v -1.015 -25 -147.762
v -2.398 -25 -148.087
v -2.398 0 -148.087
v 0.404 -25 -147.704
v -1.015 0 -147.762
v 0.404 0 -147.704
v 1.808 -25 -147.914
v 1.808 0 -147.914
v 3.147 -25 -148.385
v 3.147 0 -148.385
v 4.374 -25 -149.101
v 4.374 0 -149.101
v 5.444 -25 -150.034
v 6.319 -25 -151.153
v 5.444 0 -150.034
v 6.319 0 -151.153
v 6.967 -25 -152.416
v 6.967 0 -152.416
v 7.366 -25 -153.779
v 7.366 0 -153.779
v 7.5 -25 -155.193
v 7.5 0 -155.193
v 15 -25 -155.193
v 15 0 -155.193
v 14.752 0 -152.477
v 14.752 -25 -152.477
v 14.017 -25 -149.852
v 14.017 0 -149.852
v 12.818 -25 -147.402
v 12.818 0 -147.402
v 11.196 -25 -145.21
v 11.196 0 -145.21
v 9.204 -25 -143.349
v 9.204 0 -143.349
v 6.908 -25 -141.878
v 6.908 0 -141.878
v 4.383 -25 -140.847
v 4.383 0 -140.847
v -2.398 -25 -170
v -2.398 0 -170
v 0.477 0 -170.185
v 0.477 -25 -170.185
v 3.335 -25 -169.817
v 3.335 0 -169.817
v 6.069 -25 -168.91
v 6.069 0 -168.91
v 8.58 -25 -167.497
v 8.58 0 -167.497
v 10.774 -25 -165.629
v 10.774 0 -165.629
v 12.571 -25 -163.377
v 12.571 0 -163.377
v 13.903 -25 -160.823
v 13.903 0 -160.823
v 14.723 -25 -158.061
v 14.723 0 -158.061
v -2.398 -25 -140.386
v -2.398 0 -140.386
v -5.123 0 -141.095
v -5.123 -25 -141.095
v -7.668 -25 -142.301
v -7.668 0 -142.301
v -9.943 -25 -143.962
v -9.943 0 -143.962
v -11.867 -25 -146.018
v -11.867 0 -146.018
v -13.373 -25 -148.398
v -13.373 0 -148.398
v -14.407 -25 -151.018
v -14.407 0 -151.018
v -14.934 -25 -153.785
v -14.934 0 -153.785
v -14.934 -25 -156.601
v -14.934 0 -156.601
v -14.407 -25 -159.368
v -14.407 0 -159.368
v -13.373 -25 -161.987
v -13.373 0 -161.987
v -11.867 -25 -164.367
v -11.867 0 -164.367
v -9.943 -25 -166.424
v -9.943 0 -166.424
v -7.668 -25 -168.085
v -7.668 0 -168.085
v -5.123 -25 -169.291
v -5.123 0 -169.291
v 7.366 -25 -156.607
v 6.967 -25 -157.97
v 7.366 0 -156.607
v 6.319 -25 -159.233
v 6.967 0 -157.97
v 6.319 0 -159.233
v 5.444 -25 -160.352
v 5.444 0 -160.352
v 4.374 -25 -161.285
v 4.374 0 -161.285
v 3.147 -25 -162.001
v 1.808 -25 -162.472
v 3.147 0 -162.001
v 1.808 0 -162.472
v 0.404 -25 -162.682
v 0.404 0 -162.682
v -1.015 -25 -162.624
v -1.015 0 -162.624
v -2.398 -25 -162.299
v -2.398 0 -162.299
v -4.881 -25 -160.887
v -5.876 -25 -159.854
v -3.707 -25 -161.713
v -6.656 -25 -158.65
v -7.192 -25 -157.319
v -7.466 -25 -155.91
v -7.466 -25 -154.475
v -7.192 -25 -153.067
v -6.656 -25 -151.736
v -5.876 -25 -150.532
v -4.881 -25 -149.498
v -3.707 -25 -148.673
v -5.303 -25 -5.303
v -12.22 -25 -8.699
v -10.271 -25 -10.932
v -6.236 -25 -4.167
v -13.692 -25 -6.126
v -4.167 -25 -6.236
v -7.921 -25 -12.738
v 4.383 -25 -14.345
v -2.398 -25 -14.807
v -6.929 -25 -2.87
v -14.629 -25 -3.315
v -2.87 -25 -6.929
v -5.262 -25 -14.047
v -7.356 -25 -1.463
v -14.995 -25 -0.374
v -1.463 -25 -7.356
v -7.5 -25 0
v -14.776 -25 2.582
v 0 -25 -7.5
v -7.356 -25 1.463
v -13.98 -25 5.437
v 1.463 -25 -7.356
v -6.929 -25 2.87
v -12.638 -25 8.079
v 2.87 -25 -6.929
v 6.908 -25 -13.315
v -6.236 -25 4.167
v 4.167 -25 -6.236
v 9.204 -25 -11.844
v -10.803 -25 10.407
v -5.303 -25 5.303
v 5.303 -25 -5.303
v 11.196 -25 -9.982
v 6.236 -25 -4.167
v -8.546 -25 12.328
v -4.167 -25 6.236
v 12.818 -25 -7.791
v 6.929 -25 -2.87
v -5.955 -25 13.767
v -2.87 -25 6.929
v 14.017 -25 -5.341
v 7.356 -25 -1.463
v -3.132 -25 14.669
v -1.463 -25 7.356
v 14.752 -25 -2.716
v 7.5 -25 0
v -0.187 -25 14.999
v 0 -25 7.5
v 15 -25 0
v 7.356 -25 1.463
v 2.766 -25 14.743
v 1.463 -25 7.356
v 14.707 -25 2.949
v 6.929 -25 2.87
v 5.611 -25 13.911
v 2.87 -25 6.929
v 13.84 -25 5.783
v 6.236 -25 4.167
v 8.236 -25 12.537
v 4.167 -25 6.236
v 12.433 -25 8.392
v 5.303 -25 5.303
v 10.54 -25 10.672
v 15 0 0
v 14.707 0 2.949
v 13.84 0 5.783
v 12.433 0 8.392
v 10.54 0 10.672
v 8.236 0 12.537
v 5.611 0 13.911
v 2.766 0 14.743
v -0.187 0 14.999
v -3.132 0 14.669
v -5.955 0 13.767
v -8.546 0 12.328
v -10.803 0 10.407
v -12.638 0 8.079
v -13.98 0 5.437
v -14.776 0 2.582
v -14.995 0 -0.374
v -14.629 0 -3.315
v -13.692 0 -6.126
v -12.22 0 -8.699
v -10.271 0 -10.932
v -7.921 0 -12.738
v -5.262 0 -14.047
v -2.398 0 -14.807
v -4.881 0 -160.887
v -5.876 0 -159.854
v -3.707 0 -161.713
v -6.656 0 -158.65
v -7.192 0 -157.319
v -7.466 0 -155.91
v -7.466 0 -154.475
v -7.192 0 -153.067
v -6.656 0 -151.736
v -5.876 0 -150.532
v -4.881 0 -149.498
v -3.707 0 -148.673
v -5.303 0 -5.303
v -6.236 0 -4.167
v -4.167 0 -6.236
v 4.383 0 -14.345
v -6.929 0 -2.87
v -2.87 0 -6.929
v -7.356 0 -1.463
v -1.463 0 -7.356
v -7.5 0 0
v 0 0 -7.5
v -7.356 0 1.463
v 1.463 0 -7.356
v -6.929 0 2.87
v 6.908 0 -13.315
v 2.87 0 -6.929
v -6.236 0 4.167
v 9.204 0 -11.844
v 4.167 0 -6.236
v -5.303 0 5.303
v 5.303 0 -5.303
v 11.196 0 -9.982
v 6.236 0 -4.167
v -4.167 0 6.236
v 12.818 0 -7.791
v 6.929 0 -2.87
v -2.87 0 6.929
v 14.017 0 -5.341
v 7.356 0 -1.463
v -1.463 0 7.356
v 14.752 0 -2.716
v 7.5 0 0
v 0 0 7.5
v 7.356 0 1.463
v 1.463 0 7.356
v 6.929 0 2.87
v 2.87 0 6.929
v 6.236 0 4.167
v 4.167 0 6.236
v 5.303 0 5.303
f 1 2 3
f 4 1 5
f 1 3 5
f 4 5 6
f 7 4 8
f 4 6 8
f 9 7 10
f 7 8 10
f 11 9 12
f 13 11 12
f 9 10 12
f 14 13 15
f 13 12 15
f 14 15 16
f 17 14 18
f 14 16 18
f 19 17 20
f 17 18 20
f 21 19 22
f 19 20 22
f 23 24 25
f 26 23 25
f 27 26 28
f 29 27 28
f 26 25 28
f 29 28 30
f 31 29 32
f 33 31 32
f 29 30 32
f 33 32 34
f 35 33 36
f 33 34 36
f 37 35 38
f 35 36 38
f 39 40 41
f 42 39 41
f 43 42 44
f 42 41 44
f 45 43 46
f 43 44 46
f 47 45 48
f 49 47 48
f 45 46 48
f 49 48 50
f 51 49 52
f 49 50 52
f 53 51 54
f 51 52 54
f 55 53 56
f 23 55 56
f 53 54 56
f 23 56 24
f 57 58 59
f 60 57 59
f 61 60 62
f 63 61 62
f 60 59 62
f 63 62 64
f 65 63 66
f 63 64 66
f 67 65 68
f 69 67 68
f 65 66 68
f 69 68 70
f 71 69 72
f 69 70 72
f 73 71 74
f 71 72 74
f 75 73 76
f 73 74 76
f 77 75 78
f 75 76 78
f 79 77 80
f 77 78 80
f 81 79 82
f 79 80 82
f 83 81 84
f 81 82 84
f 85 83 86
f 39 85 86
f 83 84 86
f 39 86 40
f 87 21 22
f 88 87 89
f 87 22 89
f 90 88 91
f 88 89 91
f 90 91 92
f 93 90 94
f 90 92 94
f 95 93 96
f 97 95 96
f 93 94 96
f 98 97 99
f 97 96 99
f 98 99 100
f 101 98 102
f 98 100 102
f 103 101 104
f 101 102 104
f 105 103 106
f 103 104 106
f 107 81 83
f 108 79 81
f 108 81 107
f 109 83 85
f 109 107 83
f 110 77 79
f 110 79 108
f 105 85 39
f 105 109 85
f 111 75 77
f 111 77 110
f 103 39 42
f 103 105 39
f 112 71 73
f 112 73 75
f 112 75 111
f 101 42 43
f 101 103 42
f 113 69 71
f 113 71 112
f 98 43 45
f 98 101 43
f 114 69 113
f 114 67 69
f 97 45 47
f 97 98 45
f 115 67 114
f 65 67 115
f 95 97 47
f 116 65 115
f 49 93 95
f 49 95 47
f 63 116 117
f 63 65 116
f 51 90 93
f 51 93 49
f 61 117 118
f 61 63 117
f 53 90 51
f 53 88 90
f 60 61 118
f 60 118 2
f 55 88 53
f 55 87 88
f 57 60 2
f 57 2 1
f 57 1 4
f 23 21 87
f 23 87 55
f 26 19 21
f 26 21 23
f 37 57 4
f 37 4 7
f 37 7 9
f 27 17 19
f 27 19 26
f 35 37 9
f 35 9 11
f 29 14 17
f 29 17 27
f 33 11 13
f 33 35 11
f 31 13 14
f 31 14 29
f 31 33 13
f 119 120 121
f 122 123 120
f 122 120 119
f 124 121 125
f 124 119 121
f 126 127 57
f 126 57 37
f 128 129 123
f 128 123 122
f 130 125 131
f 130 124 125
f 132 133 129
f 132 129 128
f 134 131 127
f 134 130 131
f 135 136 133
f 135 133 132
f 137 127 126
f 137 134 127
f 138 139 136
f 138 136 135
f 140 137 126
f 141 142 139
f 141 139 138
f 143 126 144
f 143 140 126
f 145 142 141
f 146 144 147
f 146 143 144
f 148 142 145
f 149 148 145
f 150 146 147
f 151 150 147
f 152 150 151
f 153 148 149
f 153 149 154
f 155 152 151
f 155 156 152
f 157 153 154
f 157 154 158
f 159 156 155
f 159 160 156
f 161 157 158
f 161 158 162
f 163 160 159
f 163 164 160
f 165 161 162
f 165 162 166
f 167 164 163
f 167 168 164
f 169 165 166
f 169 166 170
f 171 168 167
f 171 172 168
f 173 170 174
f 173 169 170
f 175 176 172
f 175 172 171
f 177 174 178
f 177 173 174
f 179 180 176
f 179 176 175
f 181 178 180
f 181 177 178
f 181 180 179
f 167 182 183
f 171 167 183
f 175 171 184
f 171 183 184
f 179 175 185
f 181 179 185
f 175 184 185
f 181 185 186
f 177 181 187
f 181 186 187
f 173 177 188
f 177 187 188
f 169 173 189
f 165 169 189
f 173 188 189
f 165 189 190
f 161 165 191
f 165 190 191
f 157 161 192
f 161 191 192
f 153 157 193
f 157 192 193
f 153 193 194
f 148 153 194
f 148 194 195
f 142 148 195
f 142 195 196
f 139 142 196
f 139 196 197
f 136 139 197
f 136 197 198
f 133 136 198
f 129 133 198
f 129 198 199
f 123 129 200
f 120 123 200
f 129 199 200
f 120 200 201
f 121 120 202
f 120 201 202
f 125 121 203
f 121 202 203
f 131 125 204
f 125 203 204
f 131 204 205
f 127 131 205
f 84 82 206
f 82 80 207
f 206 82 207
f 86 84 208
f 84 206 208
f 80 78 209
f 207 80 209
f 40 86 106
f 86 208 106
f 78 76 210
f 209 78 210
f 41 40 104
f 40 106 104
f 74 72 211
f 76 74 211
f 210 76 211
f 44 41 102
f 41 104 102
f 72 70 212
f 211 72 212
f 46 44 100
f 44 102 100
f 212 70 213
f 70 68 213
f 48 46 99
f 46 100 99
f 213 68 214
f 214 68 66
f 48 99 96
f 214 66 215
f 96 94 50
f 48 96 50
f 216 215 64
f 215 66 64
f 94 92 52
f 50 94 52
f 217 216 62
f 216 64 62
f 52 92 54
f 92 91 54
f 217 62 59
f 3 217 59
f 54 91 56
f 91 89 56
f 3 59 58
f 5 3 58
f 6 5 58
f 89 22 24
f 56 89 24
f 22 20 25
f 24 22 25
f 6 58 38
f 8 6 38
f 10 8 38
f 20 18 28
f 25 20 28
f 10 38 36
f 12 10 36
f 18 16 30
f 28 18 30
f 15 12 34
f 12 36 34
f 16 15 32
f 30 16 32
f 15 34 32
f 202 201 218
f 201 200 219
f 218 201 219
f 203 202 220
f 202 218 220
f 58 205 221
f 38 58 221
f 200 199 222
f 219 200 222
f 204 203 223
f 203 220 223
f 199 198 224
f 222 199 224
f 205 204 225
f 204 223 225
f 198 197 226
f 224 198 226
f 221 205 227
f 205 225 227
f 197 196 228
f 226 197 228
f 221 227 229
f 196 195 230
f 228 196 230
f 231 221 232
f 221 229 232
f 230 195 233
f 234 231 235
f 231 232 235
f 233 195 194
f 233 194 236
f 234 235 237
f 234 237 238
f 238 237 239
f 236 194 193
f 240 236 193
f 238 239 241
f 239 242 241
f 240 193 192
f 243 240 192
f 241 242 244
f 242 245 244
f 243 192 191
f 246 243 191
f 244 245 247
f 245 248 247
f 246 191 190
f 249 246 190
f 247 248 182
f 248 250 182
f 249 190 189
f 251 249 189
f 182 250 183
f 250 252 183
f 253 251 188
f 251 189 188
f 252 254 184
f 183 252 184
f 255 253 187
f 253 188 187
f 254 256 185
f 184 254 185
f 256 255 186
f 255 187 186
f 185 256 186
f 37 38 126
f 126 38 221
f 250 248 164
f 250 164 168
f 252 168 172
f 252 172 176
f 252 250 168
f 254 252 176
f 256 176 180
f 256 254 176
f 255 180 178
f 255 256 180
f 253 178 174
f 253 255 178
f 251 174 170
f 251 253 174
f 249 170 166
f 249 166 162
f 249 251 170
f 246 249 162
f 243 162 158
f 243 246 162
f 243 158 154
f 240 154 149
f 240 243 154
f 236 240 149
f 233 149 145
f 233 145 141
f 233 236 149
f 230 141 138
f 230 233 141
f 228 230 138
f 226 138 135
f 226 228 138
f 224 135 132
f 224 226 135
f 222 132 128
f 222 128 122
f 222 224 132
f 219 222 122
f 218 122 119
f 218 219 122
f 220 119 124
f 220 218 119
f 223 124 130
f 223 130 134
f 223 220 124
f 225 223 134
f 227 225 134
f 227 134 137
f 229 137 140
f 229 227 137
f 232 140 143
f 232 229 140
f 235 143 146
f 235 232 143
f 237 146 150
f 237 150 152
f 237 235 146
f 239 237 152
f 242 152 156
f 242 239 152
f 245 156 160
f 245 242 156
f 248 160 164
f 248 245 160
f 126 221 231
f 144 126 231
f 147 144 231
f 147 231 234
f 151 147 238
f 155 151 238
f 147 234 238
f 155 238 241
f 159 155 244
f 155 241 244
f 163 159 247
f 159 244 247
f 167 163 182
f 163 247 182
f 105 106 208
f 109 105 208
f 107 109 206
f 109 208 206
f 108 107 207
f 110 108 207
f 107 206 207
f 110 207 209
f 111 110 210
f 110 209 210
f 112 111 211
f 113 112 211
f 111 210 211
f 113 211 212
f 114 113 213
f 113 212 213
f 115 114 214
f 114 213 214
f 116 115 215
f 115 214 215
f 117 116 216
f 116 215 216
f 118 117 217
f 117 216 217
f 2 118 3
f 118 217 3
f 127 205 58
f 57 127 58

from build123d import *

# Parameters (mm, degrees)
F0_R     = 7.5
F1_DEPTH = 25


with BuildPart() as f1:
    # F0 (on Front) → F1 (new body)
    with BuildSketch(Plane.XZ):
        with BuildLine():
            ThreePointArc((4.382898, -14.34539), (12.05702, -8.923467), (15, 0))
            ThreePointArc((15, 0), (-9.72197, 11.422929), (-2.397775, -14.807116))
            ThreePointArc((-2.397775, -14.807116), (1.019056, -14.965344), (4.382898, -14.34539))
        make_face()
        Circle(F0_R, mode=Mode.SUBTRACT)
        with BuildLine():
            ThreePointArc((4.382898, -14.34539), (1.019056, -14.965344), (-2.397775, -14.807116))
            Line((-2.397775, -14.807116), (-2.397775, -140.385768))
            ThreePointArc((-2.397775, -140.385768), (1.019056, -140.22754), (4.382898, -140.847494))
            Line((4.382898, -140.847494), (4.382898, -14.34539))
        make_face()
        with BuildLine():
            Line((-2.397775, -148.086501), (-2.397775, -140.385768))
            ThreePointArc((-2.397775, -140.385768), (-15, -155.192884), (-2.397775, -170))
            Line((-2.397775, -170), (-2.397775, -162.299267))
            ThreePointArc((-2.397775, -162.299267), (-7.5, -155.192884), (-2.397775, -148.086501))
        make_face()
        with BuildLine():
            ThreePointArc((4.382898, -140.847494), (1.019056, -140.22754), (-2.397775, -140.385768))
            Line((-2.397775, -140.385768), (-2.397775, -148.086501))
            ThreePointArc((-2.397775, -148.086501), (4.374168, -149.10054), (7.5, -155.192884))
            ThreePointArc((7.5, -155.192884), (4.374168, -161.285228), (-2.397775, -162.299267))
            Line((-2.397775, -162.299267), (-2.397775, -170))
            ThreePointArc((-2.397775, -170), (9.72197, -166.615813), (15, -155.192884))
            ThreePointArc((15, -155.192884), (12.05702, -146.269417), (4.382898, -140.847494))
        make_face()
    extrude(amount=F1_DEPTH)


solid = f1.part
